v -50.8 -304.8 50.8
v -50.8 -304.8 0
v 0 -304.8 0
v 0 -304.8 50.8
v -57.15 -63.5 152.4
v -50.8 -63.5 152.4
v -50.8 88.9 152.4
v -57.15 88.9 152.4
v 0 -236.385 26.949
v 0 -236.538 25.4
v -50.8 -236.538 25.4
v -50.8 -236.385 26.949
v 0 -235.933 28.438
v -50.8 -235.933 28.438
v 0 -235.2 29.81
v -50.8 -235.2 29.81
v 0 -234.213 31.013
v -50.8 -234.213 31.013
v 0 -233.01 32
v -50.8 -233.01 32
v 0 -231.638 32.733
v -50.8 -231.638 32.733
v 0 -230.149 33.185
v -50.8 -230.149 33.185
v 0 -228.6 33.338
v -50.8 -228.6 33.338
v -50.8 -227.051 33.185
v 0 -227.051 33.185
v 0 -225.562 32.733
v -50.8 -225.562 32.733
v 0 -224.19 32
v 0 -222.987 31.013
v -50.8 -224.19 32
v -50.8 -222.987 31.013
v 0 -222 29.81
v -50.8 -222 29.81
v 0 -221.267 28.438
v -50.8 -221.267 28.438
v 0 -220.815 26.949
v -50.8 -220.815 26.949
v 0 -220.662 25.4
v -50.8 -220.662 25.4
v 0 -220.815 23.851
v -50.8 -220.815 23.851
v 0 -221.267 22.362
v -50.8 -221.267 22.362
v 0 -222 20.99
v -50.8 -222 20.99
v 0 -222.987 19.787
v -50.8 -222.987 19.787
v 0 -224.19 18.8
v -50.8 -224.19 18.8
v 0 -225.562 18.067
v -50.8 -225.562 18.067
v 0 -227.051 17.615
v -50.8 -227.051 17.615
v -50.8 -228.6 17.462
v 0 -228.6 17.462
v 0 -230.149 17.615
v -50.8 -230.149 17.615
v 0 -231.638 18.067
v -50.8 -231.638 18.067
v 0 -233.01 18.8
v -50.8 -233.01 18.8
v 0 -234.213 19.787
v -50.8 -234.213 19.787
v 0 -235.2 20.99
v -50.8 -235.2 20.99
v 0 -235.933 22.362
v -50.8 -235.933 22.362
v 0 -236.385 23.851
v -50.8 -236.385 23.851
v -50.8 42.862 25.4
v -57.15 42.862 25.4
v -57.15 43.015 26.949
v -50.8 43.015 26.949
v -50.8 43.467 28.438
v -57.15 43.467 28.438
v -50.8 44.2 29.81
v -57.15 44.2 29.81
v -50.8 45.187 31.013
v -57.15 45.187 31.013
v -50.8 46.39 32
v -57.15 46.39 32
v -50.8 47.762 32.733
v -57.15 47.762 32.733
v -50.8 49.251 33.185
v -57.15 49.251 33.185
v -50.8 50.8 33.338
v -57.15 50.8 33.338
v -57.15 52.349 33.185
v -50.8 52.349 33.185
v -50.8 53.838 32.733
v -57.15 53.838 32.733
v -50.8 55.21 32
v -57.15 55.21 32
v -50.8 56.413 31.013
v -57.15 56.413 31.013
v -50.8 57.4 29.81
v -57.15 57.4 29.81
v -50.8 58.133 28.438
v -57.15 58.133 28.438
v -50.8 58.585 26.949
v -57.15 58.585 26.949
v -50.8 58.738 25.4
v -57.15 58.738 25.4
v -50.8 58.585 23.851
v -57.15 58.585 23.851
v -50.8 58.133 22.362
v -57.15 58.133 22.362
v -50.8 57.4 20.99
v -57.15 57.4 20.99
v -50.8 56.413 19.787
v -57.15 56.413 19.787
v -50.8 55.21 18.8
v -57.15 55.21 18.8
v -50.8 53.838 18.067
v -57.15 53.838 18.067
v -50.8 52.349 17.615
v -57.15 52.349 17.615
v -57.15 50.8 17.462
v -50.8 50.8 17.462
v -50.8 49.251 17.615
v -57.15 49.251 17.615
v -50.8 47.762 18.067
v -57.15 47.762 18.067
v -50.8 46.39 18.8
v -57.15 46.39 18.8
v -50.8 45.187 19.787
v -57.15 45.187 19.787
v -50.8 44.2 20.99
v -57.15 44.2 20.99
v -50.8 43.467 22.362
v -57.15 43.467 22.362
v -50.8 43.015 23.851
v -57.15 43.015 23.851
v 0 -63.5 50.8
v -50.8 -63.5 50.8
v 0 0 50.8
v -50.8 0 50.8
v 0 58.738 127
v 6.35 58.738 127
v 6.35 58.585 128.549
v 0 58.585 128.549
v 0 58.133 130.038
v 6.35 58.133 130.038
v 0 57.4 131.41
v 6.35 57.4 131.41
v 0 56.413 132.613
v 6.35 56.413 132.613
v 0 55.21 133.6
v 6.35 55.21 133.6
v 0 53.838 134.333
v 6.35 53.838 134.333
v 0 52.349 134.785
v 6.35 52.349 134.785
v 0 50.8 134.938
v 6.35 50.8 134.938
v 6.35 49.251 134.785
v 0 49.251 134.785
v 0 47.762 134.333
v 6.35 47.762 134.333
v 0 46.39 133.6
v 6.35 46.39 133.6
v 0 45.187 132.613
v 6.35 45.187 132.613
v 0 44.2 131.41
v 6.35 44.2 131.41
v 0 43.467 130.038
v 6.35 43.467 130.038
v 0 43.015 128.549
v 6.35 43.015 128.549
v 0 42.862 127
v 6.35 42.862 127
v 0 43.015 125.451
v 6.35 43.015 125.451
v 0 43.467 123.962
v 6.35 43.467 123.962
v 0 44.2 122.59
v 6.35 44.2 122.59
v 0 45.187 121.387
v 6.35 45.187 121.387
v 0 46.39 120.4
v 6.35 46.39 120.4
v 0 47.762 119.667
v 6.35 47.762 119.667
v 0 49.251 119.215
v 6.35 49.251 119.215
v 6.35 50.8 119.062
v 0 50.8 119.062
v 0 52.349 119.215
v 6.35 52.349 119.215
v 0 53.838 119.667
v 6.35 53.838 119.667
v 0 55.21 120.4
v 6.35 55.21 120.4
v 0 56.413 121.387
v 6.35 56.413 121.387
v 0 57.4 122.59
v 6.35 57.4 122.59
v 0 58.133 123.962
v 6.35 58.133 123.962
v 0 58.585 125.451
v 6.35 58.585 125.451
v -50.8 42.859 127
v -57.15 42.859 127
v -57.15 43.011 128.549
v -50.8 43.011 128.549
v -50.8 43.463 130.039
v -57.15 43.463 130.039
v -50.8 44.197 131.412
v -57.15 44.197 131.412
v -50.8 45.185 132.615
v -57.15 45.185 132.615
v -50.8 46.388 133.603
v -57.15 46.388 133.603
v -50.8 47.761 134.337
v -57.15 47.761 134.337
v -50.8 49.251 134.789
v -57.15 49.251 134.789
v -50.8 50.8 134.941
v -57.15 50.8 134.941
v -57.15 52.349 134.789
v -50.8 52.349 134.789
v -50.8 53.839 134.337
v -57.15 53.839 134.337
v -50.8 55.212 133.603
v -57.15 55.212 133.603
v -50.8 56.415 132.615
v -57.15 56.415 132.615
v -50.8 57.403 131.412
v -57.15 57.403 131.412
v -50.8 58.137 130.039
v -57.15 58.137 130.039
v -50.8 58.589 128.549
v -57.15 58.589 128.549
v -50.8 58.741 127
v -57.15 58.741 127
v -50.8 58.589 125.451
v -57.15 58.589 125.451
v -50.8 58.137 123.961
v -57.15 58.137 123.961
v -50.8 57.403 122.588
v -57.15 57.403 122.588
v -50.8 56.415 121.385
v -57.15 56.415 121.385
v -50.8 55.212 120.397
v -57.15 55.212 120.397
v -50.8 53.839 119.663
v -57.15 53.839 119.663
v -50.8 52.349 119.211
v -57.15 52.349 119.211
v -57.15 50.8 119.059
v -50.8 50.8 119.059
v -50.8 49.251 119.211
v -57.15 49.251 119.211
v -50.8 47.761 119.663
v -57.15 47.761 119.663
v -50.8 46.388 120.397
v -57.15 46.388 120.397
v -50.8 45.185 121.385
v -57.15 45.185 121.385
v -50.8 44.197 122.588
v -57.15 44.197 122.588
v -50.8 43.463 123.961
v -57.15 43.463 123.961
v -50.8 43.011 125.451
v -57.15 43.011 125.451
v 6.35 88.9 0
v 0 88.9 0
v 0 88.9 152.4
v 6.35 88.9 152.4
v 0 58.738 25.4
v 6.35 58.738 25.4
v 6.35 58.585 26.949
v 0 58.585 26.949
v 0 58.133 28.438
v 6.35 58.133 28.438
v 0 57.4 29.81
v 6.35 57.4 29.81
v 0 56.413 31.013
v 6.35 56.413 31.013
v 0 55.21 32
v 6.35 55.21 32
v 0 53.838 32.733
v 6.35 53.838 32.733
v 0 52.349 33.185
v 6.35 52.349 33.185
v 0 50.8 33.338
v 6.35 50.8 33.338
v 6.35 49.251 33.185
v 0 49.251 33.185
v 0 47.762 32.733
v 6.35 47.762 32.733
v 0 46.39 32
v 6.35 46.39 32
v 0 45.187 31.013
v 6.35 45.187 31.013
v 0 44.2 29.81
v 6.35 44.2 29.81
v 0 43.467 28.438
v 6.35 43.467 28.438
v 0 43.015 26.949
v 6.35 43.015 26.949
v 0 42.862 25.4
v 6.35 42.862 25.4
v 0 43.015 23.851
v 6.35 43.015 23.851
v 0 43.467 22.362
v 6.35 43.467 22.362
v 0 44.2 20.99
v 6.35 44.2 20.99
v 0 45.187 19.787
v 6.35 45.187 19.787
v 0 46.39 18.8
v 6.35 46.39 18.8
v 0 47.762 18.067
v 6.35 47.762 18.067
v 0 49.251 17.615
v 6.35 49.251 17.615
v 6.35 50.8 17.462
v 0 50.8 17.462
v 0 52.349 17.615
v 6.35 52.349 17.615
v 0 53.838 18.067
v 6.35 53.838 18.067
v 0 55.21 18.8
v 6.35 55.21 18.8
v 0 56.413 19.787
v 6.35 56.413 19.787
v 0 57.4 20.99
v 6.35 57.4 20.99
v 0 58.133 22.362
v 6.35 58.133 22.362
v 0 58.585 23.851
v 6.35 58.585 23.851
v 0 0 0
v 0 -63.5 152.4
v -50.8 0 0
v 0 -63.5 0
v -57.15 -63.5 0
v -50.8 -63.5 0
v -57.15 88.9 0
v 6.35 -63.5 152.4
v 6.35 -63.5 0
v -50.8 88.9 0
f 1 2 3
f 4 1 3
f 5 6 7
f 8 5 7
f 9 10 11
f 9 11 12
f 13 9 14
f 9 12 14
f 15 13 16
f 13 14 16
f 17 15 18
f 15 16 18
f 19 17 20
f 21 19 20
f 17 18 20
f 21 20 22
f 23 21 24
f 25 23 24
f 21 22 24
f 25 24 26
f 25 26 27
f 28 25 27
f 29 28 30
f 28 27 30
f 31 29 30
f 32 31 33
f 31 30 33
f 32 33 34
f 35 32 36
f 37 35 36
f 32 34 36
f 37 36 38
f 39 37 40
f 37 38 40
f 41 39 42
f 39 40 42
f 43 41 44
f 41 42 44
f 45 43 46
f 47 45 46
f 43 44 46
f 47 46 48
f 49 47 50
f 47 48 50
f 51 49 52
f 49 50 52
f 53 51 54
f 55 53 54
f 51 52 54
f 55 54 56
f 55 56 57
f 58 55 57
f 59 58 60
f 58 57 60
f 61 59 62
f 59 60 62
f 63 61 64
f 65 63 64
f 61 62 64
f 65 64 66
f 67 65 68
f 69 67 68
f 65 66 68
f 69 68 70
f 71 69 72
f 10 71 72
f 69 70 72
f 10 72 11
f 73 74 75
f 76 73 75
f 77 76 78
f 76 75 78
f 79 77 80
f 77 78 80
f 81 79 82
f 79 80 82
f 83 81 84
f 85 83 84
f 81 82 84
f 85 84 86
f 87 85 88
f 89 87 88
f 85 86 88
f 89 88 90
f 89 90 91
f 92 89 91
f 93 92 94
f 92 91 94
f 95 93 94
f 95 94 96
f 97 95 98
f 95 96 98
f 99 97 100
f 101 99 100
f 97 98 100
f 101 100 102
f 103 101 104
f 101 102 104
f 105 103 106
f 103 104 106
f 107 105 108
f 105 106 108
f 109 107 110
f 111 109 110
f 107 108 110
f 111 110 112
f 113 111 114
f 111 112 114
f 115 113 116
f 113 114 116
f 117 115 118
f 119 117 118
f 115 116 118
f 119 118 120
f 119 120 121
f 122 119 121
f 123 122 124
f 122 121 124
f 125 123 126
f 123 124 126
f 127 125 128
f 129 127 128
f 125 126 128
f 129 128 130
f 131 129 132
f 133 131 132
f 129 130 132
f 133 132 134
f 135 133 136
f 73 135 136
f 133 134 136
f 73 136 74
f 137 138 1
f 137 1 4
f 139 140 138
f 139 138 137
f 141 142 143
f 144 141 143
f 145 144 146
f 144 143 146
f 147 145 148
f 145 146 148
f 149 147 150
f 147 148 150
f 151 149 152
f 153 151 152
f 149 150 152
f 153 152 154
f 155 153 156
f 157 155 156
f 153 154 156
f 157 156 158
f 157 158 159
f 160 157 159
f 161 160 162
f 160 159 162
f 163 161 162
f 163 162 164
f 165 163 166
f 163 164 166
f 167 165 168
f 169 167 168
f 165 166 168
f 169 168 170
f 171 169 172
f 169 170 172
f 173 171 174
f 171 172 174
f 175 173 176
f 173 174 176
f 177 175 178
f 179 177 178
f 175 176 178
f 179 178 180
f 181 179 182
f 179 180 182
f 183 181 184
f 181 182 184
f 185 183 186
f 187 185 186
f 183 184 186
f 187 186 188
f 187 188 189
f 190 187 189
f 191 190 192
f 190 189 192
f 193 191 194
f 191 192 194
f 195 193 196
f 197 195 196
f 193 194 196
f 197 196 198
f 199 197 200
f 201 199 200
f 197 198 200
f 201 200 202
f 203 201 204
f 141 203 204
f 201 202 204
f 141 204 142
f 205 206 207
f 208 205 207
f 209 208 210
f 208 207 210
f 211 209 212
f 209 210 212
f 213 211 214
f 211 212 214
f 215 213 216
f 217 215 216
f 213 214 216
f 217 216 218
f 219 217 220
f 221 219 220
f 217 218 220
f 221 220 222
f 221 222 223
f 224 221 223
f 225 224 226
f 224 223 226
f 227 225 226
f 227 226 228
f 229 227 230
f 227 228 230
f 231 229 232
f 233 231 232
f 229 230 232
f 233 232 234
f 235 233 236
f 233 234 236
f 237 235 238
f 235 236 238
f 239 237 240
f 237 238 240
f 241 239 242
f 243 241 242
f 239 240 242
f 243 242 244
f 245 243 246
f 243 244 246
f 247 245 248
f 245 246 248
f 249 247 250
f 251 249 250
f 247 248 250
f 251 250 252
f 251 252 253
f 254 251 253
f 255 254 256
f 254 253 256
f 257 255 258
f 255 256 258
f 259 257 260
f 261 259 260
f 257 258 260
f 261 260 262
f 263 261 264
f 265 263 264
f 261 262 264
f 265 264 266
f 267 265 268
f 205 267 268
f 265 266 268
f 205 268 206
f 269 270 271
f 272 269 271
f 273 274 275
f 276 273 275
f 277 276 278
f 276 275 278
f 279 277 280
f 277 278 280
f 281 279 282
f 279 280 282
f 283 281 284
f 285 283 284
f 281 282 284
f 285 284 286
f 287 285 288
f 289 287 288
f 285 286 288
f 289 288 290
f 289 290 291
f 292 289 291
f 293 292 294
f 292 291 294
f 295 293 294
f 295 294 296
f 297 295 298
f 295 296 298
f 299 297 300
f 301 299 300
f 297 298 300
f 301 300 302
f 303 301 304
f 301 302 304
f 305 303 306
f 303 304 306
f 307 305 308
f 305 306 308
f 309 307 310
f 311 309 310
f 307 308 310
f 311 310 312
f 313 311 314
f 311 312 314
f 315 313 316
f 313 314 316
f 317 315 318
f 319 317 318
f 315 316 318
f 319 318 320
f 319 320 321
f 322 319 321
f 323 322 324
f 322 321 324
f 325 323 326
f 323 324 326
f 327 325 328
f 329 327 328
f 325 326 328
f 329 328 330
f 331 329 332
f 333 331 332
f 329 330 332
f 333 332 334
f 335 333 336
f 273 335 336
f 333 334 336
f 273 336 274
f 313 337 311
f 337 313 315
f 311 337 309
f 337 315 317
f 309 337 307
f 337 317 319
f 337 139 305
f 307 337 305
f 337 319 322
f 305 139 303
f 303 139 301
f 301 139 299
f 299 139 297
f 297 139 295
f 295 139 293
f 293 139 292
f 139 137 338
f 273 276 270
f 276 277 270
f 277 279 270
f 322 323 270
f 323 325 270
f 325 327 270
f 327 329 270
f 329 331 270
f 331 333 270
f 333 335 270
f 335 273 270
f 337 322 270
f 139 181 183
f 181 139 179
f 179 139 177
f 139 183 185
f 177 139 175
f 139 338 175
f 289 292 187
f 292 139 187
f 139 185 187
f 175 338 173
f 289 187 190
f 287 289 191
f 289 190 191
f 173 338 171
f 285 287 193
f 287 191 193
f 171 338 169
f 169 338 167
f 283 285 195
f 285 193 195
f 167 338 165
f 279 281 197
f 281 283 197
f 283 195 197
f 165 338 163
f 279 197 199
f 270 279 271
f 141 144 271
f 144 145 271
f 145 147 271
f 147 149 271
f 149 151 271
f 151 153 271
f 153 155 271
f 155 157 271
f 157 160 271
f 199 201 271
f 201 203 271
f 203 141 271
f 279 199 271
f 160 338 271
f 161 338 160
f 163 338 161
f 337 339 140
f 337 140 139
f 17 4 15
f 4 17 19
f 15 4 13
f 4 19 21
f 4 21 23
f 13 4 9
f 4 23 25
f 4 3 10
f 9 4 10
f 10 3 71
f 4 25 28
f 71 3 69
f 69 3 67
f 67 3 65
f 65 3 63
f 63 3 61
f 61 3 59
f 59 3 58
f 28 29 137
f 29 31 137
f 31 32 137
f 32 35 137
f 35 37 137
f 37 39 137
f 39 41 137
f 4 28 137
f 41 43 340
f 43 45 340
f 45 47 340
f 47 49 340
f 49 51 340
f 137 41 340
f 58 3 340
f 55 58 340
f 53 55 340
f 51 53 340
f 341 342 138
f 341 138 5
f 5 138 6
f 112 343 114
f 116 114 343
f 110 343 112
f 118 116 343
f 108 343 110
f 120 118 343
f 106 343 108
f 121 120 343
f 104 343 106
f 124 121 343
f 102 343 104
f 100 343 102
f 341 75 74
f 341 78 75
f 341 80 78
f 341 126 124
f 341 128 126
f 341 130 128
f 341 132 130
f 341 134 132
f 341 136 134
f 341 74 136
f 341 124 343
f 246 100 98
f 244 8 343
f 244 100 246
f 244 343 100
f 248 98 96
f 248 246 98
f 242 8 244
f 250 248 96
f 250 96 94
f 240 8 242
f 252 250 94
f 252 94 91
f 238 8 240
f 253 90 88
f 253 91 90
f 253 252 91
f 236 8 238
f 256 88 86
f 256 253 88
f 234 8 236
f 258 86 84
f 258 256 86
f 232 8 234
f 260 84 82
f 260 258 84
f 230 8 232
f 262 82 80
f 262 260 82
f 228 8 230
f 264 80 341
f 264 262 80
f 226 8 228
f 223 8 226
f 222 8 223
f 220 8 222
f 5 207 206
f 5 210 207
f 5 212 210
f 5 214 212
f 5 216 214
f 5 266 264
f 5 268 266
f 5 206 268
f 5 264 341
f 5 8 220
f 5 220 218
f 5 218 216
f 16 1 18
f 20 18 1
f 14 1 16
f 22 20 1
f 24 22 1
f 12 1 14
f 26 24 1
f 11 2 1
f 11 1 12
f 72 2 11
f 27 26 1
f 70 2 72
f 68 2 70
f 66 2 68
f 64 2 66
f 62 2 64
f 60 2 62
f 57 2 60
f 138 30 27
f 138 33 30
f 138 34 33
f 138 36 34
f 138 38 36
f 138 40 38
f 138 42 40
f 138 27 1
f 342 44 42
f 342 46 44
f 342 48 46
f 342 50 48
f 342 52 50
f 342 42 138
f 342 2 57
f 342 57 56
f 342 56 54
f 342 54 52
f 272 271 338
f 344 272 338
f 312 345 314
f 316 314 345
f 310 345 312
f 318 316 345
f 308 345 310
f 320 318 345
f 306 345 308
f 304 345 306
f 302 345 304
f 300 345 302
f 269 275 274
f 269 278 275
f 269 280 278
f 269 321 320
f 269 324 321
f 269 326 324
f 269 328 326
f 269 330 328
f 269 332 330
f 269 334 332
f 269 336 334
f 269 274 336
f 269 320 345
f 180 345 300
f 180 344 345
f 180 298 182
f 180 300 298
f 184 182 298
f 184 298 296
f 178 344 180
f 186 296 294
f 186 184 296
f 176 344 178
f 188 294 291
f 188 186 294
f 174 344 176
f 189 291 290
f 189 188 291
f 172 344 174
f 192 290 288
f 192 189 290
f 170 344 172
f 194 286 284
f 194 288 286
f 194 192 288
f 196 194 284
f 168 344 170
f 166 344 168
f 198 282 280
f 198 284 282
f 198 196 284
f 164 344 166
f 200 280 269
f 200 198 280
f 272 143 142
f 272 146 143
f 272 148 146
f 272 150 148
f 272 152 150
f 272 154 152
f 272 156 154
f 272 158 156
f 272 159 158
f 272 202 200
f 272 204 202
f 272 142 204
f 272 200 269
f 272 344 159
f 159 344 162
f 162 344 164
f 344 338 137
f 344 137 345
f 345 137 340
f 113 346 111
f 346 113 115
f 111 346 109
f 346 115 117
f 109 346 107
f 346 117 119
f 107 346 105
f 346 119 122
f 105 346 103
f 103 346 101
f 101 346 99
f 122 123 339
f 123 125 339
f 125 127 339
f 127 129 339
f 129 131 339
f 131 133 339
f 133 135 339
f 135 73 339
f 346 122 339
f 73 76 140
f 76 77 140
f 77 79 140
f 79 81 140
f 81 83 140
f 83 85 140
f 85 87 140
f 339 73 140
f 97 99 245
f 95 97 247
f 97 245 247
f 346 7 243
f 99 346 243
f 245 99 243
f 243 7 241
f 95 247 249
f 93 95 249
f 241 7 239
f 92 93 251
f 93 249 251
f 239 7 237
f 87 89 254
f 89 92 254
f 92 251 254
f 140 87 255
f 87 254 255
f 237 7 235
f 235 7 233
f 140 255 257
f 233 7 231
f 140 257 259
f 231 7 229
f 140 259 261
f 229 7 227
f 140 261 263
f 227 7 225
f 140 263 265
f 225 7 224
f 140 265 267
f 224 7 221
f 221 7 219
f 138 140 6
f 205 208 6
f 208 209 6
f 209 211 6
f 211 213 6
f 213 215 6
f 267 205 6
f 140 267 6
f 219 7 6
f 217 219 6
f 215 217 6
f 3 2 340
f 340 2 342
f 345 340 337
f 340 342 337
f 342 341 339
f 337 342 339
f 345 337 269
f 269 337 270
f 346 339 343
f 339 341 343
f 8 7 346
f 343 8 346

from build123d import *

# Parameters (mm, degrees)
F0_W      = 50.8
F0_H      = 304.8
F1_DEPTH  = 50.8
F2_W      = 63.5
F2_H      = 50.8
F3_DEPTH  = 6.35
F4_R      = 7.94131
F4_R_2    = 7.9375
F5_DEPTH  = 6.35
F6_R      = 7.9375
F7_DEPTH  = 50.8
F8_W      = 63.5
F8_H      = 50.8
F9_DEPTH  = 6.35
F10_R     = 7.9375
F11_DEPTH = 6.35


with BuildPart() as f1:
    # F0 (on Top) → F1 (new body)
    with BuildSketch(Plane.XY):
        with Locations((-25.4, -152.4)):
            Rectangle(F0_W, F0_H)
    extrude(amount=F1_DEPTH)

    # F2 (on face) → F3 (join)
    with BuildSketch(Plane(origin=(-50.8, 0, 0), x_dir=(0, -1, 0), z_dir=(-1, 0, 0))):
        Polygon((-88.9, 0), (0, 0), (0, 50.8), (63.5, 50.8), (63.5, 152.4), (-88.9, 152.4), align=None)
        with Locations((31.75, 25.4)):
            Rectangle(F2_W, F2_H)
    extrude(amount=F3_DEPTH)

    # F4 (on face) → F5 (cut)
    with BuildSketch(Plane(origin=(-57.15, 0, 0), x_dir=(0, -1, 0), z_dir=(-1, 0, 0))):
        with Locations((-50.8, 127)):
            Circle(F4_R)
        with Locations((-50.8, 25.4)):
            Circle(F4_R_2)
    extrude(amount=-F5_DEPTH, mode=Mode.SUBTRACT)

    # F6 (on face) → F7 (cut)
    with BuildSketch(Plane(origin=(-50.8, 0, 0), x_dir=(0, -1, 0), z_dir=(-1, 0, 0))):
        with Locations((228.6, 25.4)):
            Circle(F6_R)
    extrude(amount=-F7_DEPTH, mode=Mode.SUBTRACT)

    # F8 (on face) → F9 (join)
    with BuildSketch(Plane.YZ):
        with Locations((-31.75, 25.4)):
            Rectangle(F8_W, F8_H)
        Polygon((0, 50.8), (0, 0), (88.9, 0), (88.9, 152.4), (-63.5, 152.4), (-63.5, 50.8), align=None)
    extrude(amount=F9_DEPTH)

    # F10 (on face) → F11 (cut)
    with BuildSketch(Plane.YZ.offset(6.35)):
        with Locations((50.8, 127)):
            Circle(F10_R)
        with Locations((50.8, 25.4)):
            Circle(F10_R)
    extrude(amount=-F11_DEPTH, mode=Mode.SUBTRACT)


solid = f1.part
